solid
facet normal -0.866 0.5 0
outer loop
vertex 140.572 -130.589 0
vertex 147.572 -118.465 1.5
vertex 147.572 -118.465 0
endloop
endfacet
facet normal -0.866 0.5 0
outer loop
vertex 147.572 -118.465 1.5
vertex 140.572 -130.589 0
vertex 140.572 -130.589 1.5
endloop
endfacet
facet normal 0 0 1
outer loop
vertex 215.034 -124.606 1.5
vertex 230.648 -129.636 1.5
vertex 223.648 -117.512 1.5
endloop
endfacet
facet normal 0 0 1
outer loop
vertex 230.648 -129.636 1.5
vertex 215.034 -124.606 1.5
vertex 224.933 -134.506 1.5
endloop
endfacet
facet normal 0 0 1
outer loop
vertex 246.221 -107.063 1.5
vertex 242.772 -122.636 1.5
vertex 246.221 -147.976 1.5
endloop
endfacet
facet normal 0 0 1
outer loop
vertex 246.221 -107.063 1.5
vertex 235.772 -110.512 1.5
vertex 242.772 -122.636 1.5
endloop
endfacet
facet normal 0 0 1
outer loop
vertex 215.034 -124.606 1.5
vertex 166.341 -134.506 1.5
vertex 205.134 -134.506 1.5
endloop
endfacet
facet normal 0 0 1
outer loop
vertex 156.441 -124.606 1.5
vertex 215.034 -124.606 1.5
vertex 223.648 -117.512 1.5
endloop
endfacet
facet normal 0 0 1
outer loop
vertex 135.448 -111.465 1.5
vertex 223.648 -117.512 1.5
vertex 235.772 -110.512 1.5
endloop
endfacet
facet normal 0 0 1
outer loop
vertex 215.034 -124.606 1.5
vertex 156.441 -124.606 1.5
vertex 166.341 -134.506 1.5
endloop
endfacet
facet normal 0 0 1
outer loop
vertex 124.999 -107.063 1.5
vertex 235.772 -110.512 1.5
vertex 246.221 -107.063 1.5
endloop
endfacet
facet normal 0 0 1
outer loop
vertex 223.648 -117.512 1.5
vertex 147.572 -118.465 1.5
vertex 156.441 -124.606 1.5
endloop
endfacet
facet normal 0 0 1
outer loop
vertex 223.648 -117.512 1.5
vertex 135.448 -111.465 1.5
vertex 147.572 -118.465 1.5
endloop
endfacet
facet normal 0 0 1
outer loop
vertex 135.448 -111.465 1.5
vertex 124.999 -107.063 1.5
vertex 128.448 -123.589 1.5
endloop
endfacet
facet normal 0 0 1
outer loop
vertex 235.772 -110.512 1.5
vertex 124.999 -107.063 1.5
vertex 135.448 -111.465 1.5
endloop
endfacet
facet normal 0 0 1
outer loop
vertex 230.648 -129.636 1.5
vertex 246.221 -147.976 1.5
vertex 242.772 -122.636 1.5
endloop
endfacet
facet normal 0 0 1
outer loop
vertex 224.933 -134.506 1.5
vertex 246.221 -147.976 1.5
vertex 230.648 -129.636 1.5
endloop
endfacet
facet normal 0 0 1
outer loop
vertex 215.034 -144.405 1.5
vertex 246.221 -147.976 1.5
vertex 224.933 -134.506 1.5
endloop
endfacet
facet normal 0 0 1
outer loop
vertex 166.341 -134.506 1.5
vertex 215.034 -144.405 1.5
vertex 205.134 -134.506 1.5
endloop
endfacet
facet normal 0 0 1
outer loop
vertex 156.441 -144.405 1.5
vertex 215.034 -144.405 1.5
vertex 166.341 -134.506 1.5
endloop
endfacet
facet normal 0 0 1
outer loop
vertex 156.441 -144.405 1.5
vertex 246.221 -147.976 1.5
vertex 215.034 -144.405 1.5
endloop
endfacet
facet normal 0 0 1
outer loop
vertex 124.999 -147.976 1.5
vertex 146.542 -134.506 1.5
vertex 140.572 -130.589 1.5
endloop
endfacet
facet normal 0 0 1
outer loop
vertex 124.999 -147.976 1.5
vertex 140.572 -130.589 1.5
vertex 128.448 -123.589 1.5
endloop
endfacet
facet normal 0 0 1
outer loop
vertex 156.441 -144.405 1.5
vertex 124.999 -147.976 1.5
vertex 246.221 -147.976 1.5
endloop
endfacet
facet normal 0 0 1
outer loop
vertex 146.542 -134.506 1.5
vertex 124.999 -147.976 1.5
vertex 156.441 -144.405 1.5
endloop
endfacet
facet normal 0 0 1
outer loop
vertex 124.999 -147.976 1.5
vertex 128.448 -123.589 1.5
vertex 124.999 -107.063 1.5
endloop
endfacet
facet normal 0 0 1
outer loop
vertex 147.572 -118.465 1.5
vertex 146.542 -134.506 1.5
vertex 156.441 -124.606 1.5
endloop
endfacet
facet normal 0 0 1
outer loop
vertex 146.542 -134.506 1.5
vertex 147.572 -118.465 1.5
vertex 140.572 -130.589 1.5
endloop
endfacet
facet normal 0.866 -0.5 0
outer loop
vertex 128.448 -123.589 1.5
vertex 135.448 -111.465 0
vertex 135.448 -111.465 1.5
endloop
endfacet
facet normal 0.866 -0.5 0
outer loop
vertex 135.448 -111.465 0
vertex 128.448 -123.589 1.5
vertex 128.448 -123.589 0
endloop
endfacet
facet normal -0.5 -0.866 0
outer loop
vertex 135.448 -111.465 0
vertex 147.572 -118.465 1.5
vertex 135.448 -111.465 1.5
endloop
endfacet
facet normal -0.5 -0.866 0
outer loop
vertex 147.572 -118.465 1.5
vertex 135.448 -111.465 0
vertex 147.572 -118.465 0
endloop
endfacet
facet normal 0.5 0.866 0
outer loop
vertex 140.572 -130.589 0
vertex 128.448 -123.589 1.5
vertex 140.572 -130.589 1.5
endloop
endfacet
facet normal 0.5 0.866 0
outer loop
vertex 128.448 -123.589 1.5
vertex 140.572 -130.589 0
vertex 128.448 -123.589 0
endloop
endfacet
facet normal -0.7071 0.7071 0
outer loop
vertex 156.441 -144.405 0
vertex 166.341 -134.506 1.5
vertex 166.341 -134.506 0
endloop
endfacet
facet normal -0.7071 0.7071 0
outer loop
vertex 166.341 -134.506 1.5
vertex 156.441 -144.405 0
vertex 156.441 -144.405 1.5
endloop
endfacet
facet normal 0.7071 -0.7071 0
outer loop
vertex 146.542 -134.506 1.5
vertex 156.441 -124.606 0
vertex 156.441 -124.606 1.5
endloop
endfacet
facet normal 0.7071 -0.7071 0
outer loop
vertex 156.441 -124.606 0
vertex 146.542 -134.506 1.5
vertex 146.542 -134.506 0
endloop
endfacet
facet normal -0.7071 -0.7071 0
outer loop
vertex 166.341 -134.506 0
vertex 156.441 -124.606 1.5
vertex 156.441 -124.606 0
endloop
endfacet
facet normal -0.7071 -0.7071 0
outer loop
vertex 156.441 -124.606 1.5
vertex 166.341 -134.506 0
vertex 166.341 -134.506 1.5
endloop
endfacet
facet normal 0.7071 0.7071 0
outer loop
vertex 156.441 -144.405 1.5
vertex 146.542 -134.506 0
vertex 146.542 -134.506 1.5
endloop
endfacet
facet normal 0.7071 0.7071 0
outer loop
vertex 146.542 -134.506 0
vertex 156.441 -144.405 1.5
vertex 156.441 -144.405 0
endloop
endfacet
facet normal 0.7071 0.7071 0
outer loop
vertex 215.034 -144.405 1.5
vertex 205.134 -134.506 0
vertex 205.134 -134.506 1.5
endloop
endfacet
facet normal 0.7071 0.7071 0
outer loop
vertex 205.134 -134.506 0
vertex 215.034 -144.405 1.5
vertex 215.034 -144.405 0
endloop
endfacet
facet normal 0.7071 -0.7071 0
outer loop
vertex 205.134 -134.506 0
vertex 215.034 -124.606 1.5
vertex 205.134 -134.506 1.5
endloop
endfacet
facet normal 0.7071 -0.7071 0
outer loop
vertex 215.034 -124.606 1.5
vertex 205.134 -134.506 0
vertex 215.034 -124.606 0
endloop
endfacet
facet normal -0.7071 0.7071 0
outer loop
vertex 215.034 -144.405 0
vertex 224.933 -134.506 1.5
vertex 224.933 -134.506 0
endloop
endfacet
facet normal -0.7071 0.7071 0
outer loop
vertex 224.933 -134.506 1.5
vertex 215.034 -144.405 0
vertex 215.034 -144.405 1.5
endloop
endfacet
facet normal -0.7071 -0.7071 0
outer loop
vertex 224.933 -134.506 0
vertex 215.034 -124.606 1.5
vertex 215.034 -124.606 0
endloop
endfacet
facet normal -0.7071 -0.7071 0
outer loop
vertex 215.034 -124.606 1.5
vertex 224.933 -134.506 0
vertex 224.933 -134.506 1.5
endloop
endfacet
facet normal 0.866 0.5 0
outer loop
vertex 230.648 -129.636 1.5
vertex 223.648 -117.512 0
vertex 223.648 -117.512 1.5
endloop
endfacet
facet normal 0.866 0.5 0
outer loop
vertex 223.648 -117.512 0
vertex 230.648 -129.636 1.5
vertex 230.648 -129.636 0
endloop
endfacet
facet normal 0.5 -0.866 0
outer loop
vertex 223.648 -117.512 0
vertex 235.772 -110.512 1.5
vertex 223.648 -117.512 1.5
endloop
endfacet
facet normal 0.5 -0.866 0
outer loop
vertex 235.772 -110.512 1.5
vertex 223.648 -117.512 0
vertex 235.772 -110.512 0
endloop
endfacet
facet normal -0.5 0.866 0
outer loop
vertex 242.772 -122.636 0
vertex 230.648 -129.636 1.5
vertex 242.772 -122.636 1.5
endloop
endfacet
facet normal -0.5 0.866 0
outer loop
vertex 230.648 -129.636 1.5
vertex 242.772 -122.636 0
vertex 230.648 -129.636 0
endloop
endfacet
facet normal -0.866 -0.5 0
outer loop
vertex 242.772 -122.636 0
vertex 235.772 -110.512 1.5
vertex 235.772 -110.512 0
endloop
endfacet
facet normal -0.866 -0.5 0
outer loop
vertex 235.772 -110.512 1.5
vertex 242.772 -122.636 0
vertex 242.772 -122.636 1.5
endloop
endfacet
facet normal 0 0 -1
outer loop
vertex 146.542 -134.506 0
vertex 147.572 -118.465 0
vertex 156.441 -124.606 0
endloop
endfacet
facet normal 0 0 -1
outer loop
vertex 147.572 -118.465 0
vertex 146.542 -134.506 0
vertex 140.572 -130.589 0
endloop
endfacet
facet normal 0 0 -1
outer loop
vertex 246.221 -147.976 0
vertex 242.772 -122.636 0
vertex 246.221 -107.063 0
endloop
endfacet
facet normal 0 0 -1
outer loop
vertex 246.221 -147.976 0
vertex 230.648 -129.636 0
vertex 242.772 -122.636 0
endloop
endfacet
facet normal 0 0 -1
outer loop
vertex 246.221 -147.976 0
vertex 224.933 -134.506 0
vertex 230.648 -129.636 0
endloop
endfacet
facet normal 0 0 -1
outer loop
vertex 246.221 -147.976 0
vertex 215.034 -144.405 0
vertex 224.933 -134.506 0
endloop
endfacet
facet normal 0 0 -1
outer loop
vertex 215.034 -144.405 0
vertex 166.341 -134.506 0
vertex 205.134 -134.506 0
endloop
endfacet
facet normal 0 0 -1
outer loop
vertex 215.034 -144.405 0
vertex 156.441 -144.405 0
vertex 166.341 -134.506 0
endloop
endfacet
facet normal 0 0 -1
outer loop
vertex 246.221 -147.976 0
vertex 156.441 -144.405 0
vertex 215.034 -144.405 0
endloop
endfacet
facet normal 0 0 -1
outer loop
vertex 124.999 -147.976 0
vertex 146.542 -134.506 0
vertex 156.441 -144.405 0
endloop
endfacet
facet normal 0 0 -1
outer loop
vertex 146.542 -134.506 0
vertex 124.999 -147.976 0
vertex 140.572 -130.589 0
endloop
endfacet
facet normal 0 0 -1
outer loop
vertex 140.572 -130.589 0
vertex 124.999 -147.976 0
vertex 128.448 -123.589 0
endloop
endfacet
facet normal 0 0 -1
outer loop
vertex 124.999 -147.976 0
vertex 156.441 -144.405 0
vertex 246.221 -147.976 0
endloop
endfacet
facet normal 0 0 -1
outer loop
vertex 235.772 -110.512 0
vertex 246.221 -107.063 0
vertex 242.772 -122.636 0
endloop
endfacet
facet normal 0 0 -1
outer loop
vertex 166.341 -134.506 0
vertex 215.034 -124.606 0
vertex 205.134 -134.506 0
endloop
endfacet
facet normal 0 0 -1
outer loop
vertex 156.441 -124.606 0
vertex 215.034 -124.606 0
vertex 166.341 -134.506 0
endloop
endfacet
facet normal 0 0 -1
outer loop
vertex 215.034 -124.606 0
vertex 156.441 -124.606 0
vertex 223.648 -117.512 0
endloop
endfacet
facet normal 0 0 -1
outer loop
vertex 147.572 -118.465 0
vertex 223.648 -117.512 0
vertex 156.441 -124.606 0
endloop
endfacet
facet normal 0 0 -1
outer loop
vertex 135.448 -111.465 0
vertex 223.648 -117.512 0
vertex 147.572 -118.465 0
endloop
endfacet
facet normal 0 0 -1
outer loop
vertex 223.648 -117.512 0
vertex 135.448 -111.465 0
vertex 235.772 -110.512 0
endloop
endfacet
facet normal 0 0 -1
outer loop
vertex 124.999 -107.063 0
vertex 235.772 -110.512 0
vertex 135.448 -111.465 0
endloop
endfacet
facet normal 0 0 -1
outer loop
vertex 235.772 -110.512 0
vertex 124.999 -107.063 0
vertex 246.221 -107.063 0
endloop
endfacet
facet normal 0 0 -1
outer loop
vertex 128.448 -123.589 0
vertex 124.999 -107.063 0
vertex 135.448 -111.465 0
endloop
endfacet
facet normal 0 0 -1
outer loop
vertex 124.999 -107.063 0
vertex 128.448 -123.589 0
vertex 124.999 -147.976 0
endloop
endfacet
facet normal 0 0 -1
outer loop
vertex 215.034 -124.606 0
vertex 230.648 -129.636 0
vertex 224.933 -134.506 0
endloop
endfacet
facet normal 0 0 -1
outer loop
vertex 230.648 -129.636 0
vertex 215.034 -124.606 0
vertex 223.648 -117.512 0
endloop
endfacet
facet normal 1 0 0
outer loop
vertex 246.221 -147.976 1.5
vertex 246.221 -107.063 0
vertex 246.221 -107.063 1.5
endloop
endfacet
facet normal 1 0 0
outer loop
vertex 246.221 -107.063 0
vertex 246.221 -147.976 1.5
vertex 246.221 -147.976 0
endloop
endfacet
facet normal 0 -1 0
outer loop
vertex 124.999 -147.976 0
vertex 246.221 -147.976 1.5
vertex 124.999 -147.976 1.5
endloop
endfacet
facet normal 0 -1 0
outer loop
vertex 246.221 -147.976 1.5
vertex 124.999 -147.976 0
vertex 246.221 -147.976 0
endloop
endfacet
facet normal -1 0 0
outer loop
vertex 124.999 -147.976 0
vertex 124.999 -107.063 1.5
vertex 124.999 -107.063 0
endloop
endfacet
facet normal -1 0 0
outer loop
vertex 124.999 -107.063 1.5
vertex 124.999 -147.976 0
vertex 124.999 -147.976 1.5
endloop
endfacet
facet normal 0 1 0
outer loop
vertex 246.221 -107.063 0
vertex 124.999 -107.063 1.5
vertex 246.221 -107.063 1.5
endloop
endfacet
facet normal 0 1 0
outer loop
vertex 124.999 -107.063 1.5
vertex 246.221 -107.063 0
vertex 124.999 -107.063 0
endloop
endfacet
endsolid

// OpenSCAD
$fn = $preview ? 0 : 100;


difference(){
	difference() {
		union() {
			linear_extrude(height = 1.5000000000) {
				polygon(points = [[124.99852839420937, -147.97596045400934], [246.22125, -147.97596045400934], [246.22125, -107.06283240868598], [124.99852839420937, -107.06283240868598], [124.99852839420937, -147.97596045400934]]);
			}
		}
	}
	/* Holes Below*/
	union(){
		translate(v = [138.0099203653, -121.0267243797, 0]) {
			rotate(a = -30) {
				cube(center = true, size = [14, 14, 3.0000000000]);
			}
		}
		translate(v = [156.4411152545, -134.5055762724, 0]) {
			rotate(a = -45) {
				cube(center = true, size = [14, 14, 3.0000000000]);
			}
		}
		translate(v = [215.0338847455, -134.5055762724, 0]) {
			rotate(a = 45) {
				cube(center = true, size = [14, 14, 3.0000000000]);
			}
		}
		translate(v = [233.2098580290, -120.0742243797, 0]) {
			rotate(a = 30) {
				cube(center = true, size = [14, 14, 3.0000000000]);
			}
		}
	} /* End Holes */ 
}
